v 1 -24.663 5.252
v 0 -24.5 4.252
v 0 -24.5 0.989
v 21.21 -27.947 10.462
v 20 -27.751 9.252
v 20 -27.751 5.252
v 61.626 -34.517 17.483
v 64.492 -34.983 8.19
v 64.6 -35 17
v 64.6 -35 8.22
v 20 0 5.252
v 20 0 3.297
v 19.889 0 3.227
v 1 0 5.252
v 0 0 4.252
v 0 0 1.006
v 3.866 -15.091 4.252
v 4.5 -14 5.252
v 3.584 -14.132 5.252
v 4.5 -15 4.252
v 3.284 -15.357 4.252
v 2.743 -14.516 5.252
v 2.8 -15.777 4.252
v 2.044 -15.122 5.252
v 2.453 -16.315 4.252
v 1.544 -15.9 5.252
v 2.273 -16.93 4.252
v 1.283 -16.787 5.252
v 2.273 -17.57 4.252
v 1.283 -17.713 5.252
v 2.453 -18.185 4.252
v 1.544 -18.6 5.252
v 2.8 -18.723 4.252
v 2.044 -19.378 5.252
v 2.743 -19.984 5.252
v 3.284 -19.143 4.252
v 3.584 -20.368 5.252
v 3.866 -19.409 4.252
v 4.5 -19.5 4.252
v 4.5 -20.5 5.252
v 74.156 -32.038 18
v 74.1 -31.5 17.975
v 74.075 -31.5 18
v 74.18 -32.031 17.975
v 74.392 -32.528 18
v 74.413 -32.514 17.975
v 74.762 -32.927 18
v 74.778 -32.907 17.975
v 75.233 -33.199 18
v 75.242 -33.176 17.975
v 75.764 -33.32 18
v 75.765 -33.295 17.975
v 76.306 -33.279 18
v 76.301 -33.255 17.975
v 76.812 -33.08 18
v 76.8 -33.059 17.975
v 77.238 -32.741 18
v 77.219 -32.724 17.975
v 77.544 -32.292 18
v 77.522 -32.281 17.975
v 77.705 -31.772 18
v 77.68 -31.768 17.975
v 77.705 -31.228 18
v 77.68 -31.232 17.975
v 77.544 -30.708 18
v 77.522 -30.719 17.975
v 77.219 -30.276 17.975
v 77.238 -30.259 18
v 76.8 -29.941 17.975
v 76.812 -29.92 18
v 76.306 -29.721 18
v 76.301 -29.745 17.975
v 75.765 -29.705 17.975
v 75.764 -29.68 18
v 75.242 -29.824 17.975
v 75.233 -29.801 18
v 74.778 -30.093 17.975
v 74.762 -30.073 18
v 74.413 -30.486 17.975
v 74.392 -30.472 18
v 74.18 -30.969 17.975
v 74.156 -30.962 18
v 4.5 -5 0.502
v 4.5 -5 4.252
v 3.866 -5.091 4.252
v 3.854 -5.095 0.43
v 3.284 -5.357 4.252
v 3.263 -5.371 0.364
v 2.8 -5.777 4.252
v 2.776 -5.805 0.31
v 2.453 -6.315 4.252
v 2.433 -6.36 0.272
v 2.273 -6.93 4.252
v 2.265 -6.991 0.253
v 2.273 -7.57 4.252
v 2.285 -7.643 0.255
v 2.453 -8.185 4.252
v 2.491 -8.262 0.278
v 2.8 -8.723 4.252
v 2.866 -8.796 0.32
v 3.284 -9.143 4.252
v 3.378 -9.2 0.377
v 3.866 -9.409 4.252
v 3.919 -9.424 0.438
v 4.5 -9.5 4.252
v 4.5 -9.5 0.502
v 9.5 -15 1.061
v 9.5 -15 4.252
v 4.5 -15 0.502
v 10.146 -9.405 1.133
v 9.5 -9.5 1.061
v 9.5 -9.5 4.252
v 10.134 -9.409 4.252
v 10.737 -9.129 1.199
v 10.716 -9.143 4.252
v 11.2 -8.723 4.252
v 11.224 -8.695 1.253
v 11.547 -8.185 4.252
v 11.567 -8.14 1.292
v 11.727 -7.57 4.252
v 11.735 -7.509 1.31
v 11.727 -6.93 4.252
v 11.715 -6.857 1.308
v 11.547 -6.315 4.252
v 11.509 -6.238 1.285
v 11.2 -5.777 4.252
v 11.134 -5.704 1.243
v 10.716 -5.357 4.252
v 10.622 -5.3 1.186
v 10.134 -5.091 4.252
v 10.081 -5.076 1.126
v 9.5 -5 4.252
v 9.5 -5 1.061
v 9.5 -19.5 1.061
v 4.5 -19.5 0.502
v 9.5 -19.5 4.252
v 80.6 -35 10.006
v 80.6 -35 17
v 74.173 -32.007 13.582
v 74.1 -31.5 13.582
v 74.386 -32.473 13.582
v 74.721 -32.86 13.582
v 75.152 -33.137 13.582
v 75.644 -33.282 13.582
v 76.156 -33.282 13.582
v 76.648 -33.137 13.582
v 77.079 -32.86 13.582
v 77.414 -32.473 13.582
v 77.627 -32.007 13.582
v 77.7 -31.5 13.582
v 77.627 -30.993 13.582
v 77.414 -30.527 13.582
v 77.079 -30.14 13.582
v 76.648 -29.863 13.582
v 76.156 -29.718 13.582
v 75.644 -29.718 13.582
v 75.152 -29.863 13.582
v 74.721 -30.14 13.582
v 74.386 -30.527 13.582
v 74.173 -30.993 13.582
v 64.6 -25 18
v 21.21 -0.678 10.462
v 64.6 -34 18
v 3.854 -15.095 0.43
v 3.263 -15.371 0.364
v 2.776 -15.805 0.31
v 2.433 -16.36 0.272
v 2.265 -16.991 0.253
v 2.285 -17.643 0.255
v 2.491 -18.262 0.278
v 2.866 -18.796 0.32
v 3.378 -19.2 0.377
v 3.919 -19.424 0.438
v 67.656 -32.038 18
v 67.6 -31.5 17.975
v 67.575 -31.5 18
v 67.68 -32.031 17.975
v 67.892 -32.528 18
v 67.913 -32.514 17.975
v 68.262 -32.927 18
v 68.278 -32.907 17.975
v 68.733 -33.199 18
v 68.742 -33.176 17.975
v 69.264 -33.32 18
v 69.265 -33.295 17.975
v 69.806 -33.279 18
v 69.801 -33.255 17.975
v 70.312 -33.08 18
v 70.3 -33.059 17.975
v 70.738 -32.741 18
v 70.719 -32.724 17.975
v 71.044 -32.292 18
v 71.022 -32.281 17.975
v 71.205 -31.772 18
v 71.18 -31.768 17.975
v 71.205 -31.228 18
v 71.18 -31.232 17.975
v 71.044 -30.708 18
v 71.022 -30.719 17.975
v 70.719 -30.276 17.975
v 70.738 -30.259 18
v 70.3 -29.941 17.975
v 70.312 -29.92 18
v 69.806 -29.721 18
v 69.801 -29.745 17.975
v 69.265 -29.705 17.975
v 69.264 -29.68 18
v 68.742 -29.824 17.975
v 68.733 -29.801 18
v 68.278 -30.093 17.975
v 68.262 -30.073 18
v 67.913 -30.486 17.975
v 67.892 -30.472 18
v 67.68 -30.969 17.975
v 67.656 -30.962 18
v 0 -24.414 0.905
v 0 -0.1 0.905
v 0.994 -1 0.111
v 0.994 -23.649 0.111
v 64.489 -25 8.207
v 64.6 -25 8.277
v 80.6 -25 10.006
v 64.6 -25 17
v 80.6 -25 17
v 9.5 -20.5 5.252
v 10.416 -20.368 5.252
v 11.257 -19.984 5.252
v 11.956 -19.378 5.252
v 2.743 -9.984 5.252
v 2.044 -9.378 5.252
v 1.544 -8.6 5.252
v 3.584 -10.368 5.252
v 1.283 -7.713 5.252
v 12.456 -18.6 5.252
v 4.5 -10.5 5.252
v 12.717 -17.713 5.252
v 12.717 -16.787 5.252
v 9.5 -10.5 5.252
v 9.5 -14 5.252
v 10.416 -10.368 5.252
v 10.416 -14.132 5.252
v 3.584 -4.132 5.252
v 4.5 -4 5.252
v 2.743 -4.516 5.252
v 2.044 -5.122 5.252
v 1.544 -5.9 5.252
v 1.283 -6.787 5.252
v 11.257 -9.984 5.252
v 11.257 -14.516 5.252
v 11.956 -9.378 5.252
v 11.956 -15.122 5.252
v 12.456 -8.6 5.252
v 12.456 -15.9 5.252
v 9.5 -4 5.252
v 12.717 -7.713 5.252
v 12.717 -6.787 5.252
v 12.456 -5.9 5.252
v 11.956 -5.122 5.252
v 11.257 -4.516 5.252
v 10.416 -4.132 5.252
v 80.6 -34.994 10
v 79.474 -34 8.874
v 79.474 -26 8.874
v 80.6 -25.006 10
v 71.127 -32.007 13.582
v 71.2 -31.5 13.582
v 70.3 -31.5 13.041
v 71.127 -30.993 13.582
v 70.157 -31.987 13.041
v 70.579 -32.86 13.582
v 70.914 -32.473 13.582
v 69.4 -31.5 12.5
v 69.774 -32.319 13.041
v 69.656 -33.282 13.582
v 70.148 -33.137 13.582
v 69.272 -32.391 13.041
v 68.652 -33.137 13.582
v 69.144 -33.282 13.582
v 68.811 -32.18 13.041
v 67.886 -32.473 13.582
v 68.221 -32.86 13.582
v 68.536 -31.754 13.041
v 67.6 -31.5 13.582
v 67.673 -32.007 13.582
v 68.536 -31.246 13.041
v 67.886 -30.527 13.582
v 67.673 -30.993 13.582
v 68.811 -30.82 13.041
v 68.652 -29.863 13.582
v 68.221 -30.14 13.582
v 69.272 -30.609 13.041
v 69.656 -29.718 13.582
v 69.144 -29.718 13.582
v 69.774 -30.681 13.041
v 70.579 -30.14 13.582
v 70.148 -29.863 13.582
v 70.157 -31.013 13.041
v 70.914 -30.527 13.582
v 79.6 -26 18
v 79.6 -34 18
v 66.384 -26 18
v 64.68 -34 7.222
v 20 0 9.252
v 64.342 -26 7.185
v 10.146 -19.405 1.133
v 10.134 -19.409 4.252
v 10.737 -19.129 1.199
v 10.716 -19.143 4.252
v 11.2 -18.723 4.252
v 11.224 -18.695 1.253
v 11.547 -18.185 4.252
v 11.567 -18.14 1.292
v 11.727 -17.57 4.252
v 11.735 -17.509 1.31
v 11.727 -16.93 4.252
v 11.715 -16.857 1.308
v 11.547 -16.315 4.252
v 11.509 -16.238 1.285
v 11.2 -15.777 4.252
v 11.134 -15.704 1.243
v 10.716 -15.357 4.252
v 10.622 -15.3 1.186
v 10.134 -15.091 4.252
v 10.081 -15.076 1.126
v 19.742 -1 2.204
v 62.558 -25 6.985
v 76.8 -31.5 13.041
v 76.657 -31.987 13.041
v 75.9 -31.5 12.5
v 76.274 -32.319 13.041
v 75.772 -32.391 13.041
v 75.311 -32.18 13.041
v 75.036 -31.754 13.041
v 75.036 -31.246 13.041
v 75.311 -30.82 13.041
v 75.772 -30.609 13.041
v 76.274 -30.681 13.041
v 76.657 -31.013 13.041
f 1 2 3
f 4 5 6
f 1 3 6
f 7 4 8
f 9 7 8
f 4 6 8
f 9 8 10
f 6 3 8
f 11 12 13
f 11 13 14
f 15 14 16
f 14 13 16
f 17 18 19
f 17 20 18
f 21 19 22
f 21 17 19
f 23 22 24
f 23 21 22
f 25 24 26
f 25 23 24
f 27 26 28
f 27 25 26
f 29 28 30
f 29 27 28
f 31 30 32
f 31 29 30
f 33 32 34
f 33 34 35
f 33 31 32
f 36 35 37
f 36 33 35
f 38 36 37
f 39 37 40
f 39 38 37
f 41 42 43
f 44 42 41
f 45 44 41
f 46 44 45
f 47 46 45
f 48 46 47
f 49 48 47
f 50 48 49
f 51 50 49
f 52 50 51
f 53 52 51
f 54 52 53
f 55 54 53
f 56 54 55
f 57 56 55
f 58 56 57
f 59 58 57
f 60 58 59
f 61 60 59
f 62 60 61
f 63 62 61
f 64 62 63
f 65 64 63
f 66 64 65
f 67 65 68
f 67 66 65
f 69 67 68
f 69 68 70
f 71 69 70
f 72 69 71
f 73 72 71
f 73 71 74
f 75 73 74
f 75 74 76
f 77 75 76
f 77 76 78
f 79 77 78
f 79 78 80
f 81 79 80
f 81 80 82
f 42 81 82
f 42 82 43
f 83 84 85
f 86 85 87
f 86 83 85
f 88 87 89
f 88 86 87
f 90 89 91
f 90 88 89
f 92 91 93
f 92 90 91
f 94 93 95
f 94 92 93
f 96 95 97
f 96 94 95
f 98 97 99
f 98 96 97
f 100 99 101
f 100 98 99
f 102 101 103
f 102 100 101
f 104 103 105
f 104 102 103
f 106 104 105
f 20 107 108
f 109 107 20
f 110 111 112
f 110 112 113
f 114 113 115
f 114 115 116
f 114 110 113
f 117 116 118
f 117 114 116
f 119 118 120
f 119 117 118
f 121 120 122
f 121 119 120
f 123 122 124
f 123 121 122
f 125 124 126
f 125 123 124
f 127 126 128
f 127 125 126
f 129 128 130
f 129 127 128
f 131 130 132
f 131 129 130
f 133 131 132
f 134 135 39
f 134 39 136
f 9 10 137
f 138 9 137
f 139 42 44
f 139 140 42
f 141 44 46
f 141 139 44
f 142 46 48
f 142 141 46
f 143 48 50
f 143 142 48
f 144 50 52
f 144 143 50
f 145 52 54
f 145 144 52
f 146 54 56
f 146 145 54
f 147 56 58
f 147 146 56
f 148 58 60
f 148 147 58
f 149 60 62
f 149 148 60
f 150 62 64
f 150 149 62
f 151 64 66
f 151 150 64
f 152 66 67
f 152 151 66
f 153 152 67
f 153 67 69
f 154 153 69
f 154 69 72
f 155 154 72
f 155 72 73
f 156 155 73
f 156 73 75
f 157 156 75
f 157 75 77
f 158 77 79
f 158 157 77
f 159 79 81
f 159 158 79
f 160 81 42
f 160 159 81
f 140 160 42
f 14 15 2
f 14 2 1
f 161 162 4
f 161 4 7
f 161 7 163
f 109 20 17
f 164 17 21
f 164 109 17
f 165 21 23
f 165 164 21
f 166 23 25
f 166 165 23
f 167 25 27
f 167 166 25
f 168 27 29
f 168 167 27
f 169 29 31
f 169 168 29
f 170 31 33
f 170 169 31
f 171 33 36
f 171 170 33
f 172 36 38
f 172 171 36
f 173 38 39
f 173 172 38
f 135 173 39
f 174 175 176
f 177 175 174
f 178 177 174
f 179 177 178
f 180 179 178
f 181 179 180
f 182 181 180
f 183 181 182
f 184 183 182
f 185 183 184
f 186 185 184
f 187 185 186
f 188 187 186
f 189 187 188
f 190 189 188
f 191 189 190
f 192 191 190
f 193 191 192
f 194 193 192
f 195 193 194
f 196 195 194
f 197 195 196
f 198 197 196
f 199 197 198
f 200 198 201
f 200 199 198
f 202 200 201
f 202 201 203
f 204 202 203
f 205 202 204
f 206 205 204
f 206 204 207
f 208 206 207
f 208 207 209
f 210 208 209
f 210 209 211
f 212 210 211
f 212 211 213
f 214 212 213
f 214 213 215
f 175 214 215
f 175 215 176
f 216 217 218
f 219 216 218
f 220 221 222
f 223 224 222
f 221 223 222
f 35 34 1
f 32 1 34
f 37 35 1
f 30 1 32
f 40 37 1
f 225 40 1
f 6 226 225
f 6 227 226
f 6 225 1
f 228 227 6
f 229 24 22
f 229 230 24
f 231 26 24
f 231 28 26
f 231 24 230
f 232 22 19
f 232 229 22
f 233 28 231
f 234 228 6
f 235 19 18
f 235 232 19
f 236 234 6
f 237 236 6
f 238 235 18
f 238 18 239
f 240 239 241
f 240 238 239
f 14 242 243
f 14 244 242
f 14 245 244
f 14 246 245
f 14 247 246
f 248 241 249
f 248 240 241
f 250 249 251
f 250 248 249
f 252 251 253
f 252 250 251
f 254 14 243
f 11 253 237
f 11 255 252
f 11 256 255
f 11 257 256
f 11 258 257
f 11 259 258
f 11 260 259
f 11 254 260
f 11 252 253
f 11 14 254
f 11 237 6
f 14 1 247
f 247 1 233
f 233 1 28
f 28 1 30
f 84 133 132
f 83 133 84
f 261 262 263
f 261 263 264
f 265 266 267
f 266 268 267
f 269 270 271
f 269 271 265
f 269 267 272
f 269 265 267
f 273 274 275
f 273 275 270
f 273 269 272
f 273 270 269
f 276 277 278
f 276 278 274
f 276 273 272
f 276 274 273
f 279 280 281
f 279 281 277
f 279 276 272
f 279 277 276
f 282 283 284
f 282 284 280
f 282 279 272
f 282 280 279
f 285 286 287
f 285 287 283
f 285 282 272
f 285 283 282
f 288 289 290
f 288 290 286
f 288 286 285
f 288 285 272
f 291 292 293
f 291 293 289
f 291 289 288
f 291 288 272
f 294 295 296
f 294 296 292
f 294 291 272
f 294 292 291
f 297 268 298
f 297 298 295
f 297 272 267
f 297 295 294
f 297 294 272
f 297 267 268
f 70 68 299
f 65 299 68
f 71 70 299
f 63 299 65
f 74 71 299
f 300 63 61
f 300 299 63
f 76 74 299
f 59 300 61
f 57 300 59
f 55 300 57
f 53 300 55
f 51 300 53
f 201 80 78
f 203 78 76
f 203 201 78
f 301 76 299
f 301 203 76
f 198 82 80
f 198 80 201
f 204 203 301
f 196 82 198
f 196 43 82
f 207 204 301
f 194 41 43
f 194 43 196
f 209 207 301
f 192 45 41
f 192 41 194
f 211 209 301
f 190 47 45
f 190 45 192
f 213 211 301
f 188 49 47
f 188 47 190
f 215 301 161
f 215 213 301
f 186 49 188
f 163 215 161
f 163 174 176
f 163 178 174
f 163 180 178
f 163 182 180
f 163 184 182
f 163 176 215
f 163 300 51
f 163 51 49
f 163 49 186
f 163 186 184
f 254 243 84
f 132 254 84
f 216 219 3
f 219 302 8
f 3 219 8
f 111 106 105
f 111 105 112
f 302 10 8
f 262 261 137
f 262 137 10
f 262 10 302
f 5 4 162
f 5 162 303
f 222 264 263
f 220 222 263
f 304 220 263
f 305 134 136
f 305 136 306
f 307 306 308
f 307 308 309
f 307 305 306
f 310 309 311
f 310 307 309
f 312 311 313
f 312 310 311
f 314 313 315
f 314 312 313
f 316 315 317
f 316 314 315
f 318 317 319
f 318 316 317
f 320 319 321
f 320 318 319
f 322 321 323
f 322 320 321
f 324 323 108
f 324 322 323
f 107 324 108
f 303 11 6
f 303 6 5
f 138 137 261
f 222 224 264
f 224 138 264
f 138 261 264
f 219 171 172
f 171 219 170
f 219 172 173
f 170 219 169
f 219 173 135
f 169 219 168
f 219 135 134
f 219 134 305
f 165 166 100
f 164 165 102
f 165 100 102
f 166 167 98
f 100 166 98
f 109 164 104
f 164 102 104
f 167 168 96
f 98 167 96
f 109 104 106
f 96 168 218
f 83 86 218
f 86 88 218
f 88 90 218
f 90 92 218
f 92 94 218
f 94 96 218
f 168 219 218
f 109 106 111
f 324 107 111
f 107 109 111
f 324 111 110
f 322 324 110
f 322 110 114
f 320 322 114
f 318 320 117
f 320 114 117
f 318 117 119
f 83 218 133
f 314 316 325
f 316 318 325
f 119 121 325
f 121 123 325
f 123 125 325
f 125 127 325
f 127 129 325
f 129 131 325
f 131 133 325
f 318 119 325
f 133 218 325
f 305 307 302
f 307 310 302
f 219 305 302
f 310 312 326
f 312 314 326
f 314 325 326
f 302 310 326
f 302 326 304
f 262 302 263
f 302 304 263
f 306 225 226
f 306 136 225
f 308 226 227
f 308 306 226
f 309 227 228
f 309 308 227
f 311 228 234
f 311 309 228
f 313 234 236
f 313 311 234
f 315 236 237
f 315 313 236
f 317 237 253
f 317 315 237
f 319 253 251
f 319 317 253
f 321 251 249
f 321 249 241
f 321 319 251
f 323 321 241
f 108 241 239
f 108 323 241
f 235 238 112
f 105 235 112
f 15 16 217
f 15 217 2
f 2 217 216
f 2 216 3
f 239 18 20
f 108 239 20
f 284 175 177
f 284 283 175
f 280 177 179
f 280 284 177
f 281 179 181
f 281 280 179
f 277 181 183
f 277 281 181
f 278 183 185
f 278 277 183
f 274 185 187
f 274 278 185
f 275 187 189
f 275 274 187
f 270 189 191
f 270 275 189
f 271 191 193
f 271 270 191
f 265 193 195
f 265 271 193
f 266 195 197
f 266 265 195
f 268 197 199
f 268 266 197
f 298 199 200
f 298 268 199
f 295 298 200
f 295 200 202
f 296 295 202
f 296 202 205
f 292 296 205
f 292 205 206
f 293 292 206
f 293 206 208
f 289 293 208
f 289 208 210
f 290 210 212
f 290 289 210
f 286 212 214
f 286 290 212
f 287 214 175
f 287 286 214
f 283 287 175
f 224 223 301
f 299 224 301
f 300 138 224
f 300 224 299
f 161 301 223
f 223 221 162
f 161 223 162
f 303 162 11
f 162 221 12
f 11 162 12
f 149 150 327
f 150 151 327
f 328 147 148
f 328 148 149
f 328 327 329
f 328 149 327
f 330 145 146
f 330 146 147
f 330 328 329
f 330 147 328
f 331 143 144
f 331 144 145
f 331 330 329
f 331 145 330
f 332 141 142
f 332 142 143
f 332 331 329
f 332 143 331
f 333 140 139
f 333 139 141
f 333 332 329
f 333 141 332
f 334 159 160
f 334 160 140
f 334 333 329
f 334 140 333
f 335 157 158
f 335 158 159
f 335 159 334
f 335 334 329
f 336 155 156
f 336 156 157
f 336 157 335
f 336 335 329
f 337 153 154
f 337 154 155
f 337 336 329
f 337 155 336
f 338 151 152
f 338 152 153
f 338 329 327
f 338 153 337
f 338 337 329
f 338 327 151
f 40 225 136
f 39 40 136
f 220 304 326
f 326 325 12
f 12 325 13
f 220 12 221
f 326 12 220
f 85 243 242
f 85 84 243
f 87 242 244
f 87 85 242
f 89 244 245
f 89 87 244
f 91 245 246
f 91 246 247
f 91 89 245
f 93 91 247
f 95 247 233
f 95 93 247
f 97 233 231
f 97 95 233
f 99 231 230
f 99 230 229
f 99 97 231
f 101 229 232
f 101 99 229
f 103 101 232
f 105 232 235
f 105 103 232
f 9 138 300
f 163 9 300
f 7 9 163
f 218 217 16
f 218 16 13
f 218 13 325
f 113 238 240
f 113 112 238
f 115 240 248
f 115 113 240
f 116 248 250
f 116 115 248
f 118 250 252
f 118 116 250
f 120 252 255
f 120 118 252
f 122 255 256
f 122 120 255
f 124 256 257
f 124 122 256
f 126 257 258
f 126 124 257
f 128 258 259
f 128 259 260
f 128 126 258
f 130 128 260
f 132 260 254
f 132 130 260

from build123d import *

# Parameters (mm, degrees)
BOSS_EXTRUDE1_DEPTH            = 18
CUT_EXTRUDE1_DEPTH             = 90.695930788
CHAMFER1_SIZE                  = 1
CHAMFER1_SIZE_2                = 1.13269448
CHAMFER1_SIZE_3                = 1.059024281
CHAMFER1_SIZE_4                = 0.982660718
CHAMFER1_SIZE_5                = 0.90514425
CHAMFER1_SIZE_6                = 1.228376825
M3_CLEARANCE_HOLE1_D           = 3.6
M3_CLEARANCE_HOLE1_DEPTH       = 4.418450886
M3_CLEARANCE_HOLE1_CSINK_D     = 3.65
M3_CLEARANCE_HOLE1_CSINK_ANGLE = 90
M3_CLEARANCE_HOLE1_TIP         = 1.081549114


with BuildPart() as part:
    # Sketch1 → Boss-Extrude1 (new body)
    with BuildSketch(Plane.XY):
        Polygon((0, 0), (0, 24.5), (64.6, 35), (80.6, 35), (80.6, 25), (64.6, 25), (20, 0), align=None)
        with BuildLine():
            Line((4.5, 19.5), (9.5, 19.5))
            ThreePointArc((9.5, 19.5), (11.75, 17.25), (9.5, 15))
            Line((9.5, 15), (4.5, 15))
            ThreePointArc((4.5, 15), (2.25, 17.25), (4.5, 19.5))
        make_face(mode=Mode.SUBTRACT)
        with BuildLine():
            Line((4.5, 9.5), (9.5, 9.5))
            ThreePointArc((9.5, 9.5), (11.75, 7.25), (9.5, 5))
            Line((9.5, 5), (4.5, 5))
            ThreePointArc((4.5, 5), (2.25, 7.25), (4.5, 9.5))
        make_face(mode=Mode.SUBTRACT)
    extrude(amount=BOSS_EXTRUDE1_DEPTH)

    # Sketch2 → Cut-Extrude1 (cut, through all)
    with BuildSketch(Plane.XZ):
        Polygon((0, 5.251895463), (20, 5.251895463), (20, 10.251895463), (64.6, 18), (0, 18), align=None)
        Polygon((0, 0), (80.6, 9), (80.6, 0), align=None)
    extrude(amount=-CUT_EXTRUDE1_DEPTH, mode=Mode.SUBTRACT)

    # Chamfer1
    # the kernel refuses this chamfer: 1.228376825, 1.13269448, 1.059024281, 1, 0.982660718, 0.90514425 mm, written as the material it takes off along each edge
    with BuildSketch(Plane(origin=(83.171682988, 25, 18), x_dir=(0, 0, -1), z_dir=(-1, 0, 0))) as chamfer1_piece_1_section:
        Polygon((CHAMFER1_SIZE, 0), (0, -CHAMFER1_SIZE), (0, 0), align=None)
    chamfer1_piece_1 = extrude(amount=26.286731952, mode=Mode.PRIVATE)
    chamfer1_piece_1 = split(chamfer1_piece_1, bisect_by=Plane(origin=(78.731517938, 32.921254449, 18), z_dir=(0.4889606682714293, -0.87230583219623, 0)), keep=Keep.TOP, mode=Mode.PRIVATE)
    add(chamfer1_piece_1, mode=Mode.SUBTRACT)
    with BuildSketch(Plane(origin=(80.6, 37.571682988, 18), x_dir=(0, 0, -1), z_dir=(0, -1, 0))) as chamfer1_piece_2:
        Polygon((CHAMFER1_SIZE, 0), (0, -CHAMFER1_SIZE), (0, 0), align=None)
    extrude(amount=15.143365976, mode=Mode.SUBTRACT)
    with BuildSketch(Plane(origin=(56.884951036, 35, 18), x_dir=(0, 0, -1), z_dir=(1, 0, 0))) as chamfer1_piece_3:
        Polygon((CHAMFER1_SIZE, 0), (0, -CHAMFER1_SIZE), (0, 0), align=None)
    extrude(amount=26.286731952, mode=Mode.SUBTRACT)
    with BuildSketch(Plane(origin=(9.5, 9.5, 5.251895463), x_dir=(0, 1, 0), z_dir=(-1, 0, 0)), Plane(origin=(4.5, 15, 5.251895463), x_dir=(0, -1, 0), z_dir=(1, 0, 0)), Plane(origin=(9.5, 19.5, 5.251895463), x_dir=(0, 1, 0), z_dir=(-1, 0, 0)), Plane(origin=(4.5, 5, 5.251895463), x_dir=(0, -1, 0), z_dir=(1, 0, 0))) as chamfer1_piece_4:
        Polygon((CHAMFER1_SIZE, 0), (0, CHAMFER1_SIZE), (0, 0), align=None)
    extrude(amount=5, mode=Mode.SUBTRACT)
    with BuildSketch(Plane(origin=(0, -2.571682988, 5.251895463), x_dir=(0, 0, -1), z_dir=(0, 1, 0))) as chamfer1_piece_5:
        Polygon((CHAMFER1_SIZE, 0), (0, -CHAMFER1_SIZE), (0, 0), align=None)
    extrude(amount=29.643365976, mode=Mode.SUBTRACT)
    with BuildSketch(Plane(origin=(4.5, 17.25, 5.251895463), x_dir=(0, -1, 0), z_dir=(1, 0, 0))) as chamfer1_piece_6:
        Polygon((2.25 + CHAMFER1_SIZE, 0), (2.25, CHAMFER1_SIZE), (2.25, 0), align=None)
    revolve(axis=Axis((4.5, 17.25, 5.251895463), (0, 0, -1)), revolution_arc=180, mode=Mode.SUBTRACT)
    with BuildSketch(Plane(origin=(9.5, 17.25, 5.251895463), x_dir=(0, 1, 0), z_dir=(-1, 0, 0))) as chamfer1_piece_7:
        Polygon((2.25 + CHAMFER1_SIZE, 0), (2.25, CHAMFER1_SIZE), (2.25, 0), align=None)
    revolve(axis=Axis((9.5, 17.25, 5.251895463), (0, 0, -1)), revolution_arc=180, mode=Mode.SUBTRACT)
    with BuildSketch(Plane(origin=(4.5, 7.25, 5.251895463), x_dir=(0, -1, 0), z_dir=(1, 0, 0))) as chamfer1_piece_8:
        Polygon((2.25 + CHAMFER1_SIZE, 0), (2.25, CHAMFER1_SIZE), (2.25, 0), align=None)
    revolve(axis=Axis((4.5, 7.25, 5.251895463), (0, 0, -1)), revolution_arc=180, mode=Mode.SUBTRACT)
    with BuildSketch(Plane(origin=(9.5, 7.25, 5.251895463), x_dir=(0, 1, 0), z_dir=(-1, 0, 0))) as chamfer1_piece_9:
        Polygon((2.25 + CHAMFER1_SIZE, 0), (2.25, CHAMFER1_SIZE), (2.25, 0), align=None)
    revolve(axis=Axis((9.5, 7.25, 5.251895463), (0, 0, -1)), revolution_arc=180, mode=Mode.SUBTRACT)
    with BuildSketch(Plane(origin=(80.6, 22.078920721, 9), x_dir=(-0.9938234393712555, 0, -0.11097284062458136), z_dir=(0, 1, 0))) as chamfer1_piece_10:
        Polygon((CHAMFER1_SIZE_2, 0), (-CHAMFER1_SIZE * 0.110972840625, CHAMFER1_SIZE * 0.993823439371), (0, 0), align=None)
    extrude(amount=15.842158559, mode=Mode.SUBTRACT)
    with BuildSketch(Plane(origin=(17.632153336, -1.327268309, 1.968850869), x_dir=(-0.48365166299246226, 0.873592837550041, -0.05400576882050032), z_dir=(0.8681970384240761, 0.48665753274892154, 0.09694507873221696))) as chamfer1_piece_11_section:
        Polygon((CHAMFER1_SIZE, 0), (-CHAMFER1_SIZE_3 * 0.0542613542965, CHAMFER1_SIZE_3 * 0.998526767225), (0, 0), align=None)
    chamfer1_piece_11 = extrude(amount=56.825456831, mode=Mode.PRIVATE)
    chamfer1_piece_11 = split(chamfer1_piece_11, bisect_by=Plane(origin=(17.632153336, 25, 1.968850869), z_dir=(0, -1, 0)), keep=Keep.TOP, mode=Mode.PRIVATE)
    add(chamfer1_piece_11, mode=Mode.SUBTRACT)
    with BuildSketch(Plane(origin=(72.169278028, 36.230300608, 8.058604246), x_dir=(0.15848267298847146, -0.987203157180204, 0.017696576388291016), z_dir=(-0.9811056370269924, -0.15946763450129123, -0.10955273862584283))) as chamfer1_piece_12:
        Polygon((CHAMFER1_SIZE, 0), (CHAMFER1_SIZE_4 * 0.0178037373512, CHAMFER1_SIZE_4 * 0.999841500402), (0, 0), align=None)
    extrude(amount=76.130813937, mode=Mode.SUBTRACT)
    with BuildSketch(Plane(origin=(0, -2.571682988, 0), x_dir=(0, 0, 1), z_dir=(0, 1, 0))) as chamfer1_piece_13:
        Polygon((CHAMFER1_SIZE_5, 0), (CHAMFER1_SIZE * 0.110972840625, CHAMFER1_SIZE * 0.993823439371), (0, 0), align=None)
    extrude(amount=29.643365976, mode=Mode.SUBTRACT)
    with BuildSketch(Plane(origin=(20, -3.172174758, 10.251895463), x_dir=(0.9852431265776485, 0, 0.17116068921192124), z_dir=(0, 1, 0))) as chamfer1_piece_14:
        Polygon((CHAMFER1_SIZE_6, 0), (-CHAMFER1_SIZE * 0.171160689212, CHAMFER1_SIZE * 0.985243126578), (0, 0), align=None)
    extrude(amount=34.095123509, mode=Mode.SUBTRACT)
    # the kernel refuses this chamfer: 1.228376825, 1.13269448, 1.059024281, 1, 0.982660718, 0.90514425 mm, written as the material it takes off along each edge
    with BuildSketch(Plane(origin=(-1.561975393, 0, -0.174414126), x_dir=(-0.11097284062458186, 0, 0.9938234393712553), z_dir=(0.9938234393712554, 0, 0.11097284062458188))) as chamfer1_2_piece_1:
        Polygon((CHAMFER1_SIZE, 0), (0, -CHAMFER1_SIZE), (0, 0), align=None)
    extrude(amount=22.212831842, mode=Mode.SUBTRACT)
    with BuildSketch(Plane(origin=(82.030100508, 25, 9.159688642), x_dir=(-0.11097284062458178, -3.5527136788004942e-15, 0.9938234393712553), z_dir=(-0.9938234393712554, 0, -0.11097284062458179))) as chamfer1_2_piece_2_section:
        Polygon((CHAMFER1_SIZE, 0), (0, CHAMFER1_SIZE), (0, 0), align=None)
    chamfer1_2_piece_2 = extrude(amount=22.164943744, mode=Mode.PRIVATE)
    chamfer1_2_piece_2 = split(chamfer1_2_piece_2, bisect_by=Plane(origin=(79.195166365, 29.16494468, 13.640367099), z_dir=(0.42046301876729836, -0.6177234194276358, -0.6645514479253808)), keep=Keep.TOP, mode=Mode.PRIVATE)
    add(chamfer1_2_piece_2, mode=Mode.SUBTRACT)
    with BuildSketch(Plane(origin=(82.030100508, 35, 9.159688642), x_dir=(-0.11097284062458186, -7.105427357601003e-15, 0.9938234393712553), z_dir=(-0.9938234393712554, 0, -0.11097284062458188))) as chamfer1_2_piece_3:
        Polygon((CHAMFER1_SIZE, 0), (0, -CHAMFER1_SIZE), (0, 0), align=None)
    extrude(amount=18.982611683, mode=Mode.SUBTRACT)

    # M3 Clearance Hole1
    with Locations(Plane.XY.offset(18)):
        with Locations((69.4, 31.5), (75.9, 31.5)):
            CounterSinkHole(M3_CLEARANCE_HOLE1_D / 2, M3_CLEARANCE_HOLE1_CSINK_D / 2, depth=M3_CLEARANCE_HOLE1_DEPTH, counter_sink_angle=M3_CLEARANCE_HOLE1_CSINK_ANGLE)
            with Locations((0, 0, -(M3_CLEARANCE_HOLE1_DEPTH + M3_CLEARANCE_HOLE1_TIP / 2))):  # 118° drill point
                Cone(0, M3_CLEARANCE_HOLE1_D / 2, M3_CLEARANCE_HOLE1_TIP, mode=Mode.SUBTRACT)


with BuildPart() as body_2:
    # Mirror2: mirrored copy
    add(part.part.mirror(Plane(origin=(20, 0, 18), x_dir=(0, 0, 1), z_dir=(0, 1, 0))))


solid = body_2.part
